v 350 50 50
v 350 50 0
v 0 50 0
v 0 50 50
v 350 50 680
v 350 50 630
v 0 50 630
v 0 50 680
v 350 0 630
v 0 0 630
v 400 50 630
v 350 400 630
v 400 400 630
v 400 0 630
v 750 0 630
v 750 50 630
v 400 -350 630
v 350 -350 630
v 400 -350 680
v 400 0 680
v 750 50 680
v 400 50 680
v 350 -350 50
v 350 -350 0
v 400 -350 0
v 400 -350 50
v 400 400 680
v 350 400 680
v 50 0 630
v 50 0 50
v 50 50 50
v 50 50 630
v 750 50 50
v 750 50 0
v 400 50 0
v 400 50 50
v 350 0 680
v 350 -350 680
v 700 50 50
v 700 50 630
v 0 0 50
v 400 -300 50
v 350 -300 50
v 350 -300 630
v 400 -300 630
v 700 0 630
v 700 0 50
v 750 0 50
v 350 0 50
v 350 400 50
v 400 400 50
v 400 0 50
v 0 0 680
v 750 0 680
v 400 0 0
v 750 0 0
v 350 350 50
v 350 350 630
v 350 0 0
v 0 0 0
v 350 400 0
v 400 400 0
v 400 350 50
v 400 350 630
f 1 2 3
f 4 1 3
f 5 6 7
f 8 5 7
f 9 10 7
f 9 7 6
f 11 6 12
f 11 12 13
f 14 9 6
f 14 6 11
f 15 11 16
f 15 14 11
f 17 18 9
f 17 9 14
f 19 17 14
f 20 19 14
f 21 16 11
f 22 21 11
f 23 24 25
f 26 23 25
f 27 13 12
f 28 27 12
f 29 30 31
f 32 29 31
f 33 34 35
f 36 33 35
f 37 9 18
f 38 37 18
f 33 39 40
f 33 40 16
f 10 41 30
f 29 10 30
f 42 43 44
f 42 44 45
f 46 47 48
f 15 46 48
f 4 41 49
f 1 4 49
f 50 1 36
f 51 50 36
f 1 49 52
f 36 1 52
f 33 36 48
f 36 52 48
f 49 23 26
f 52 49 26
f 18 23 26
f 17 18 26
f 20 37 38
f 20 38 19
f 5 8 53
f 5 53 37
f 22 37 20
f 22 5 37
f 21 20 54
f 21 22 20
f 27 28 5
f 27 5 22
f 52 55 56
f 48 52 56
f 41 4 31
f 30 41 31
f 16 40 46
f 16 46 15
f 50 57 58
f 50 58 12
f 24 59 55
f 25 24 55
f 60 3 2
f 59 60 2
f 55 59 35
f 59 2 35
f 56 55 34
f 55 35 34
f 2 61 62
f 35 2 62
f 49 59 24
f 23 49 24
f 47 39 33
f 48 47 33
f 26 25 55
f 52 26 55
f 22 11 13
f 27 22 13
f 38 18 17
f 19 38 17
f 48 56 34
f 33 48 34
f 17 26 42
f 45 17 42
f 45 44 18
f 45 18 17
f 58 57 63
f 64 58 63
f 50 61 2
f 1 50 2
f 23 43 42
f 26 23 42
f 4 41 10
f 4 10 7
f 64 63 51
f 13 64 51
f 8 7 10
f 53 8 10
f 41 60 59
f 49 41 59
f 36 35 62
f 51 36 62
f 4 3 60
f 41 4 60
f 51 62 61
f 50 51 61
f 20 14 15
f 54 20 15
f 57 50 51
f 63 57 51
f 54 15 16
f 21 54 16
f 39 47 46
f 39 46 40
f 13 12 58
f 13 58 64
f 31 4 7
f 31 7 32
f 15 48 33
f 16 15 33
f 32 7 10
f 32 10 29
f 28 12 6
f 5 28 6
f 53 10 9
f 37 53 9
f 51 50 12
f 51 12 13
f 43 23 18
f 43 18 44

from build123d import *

# Parameters (mm, degrees)
F1_DEPTH = 680
F2_W     = 582.338988781
F2_H     = 580
F3_DEPTH = 400.001
F4_W     = 50
F4_H     = 580
F5_DEPTH = 350.001
F6_W     = 50
F6_H     = 580
F7_DEPTH = 167.662011219
F8_W     = 50
F8_H     = 50
F9_DEPTH = 580


with BuildPart() as f1:
    # F0 (on Top) → F1 (new body)
    with BuildSketch(Plane.XY):
        Polygon((0, 50), (0, 0), (350, 0), (350, -350), (400, -350), (400, 0), (750, 0), (750, 50), (400, 50), (400, 400), (350, 400), (350, 50), align=None)
    extrude(amount=F1_DEPTH)

    # F2 (on face) → F3 (cut, through all)
    with BuildSketch(Plane.XZ):
        with Locations((291.1694943905, 340)):
            Rectangle(F2_W, F2_H)
    extrude(amount=-F3_DEPTH, mode=Mode.SUBTRACT)

    # F4 (on face) → F5 (cut, through all)
    with BuildSketch(Plane(origin=(0, 0, 0), x_dir=(-1, 0, 0), z_dir=(0, 1, 0))):
        with Locations((-375, 340)):
            Rectangle(F4_W, F4_H)
    extrude(amount=-F5_DEPTH, mode=Mode.SUBTRACT)

    # F6 (on face) → F7 (cut, through all)
    with BuildSketch(Plane(origin=(582.338988781, 0, 0), x_dir=(0, -1, 0), z_dir=(-1, 0, 0))):
        with Locations((-25, 340)):
            Rectangle(F6_W, F6_H)
    extrude(amount=-F7_DEPTH, mode=Mode.SUBTRACT)


with BuildPart() as f9:
    # F8 (on face) → F9 (new body, through all)
    with BuildSketch(Plane.XY.offset(50)):
        with Locations((725, 25)):
            Rectangle(F8_W, F8_H)
    extrude(amount=F9_DEPTH)


with BuildPart() as f9b:
    # F8 (on face) → F9, piece 2 (new body, through all)
    with BuildSketch(Plane.XY.offset(50)):
        with Locations((375, 375)):
            Rectangle(F8_W, F8_H)
    extrude(amount=F9_DEPTH)


with BuildPart() as f9c:
    # F8 (on face) → F9, piece 3 (new body, through all)
    with BuildSketch(Plane.XY.offset(50)):
        with Locations((25, 25)):
            Rectangle(F8_W, F8_H)
    extrude(amount=F9_DEPTH)


with BuildPart() as f9d:
    # F8 (on face) → F9, piece 4 (new body, through all)
    with BuildSketch(Plane.XY.offset(50)):
        with Locations((375, -325)):
            Rectangle(F8_W, F8_H)
    extrude(amount=F9_DEPTH)


solid = Compound([f1.part, f9.part, f9b.part, f9c.part, f9d.part])
